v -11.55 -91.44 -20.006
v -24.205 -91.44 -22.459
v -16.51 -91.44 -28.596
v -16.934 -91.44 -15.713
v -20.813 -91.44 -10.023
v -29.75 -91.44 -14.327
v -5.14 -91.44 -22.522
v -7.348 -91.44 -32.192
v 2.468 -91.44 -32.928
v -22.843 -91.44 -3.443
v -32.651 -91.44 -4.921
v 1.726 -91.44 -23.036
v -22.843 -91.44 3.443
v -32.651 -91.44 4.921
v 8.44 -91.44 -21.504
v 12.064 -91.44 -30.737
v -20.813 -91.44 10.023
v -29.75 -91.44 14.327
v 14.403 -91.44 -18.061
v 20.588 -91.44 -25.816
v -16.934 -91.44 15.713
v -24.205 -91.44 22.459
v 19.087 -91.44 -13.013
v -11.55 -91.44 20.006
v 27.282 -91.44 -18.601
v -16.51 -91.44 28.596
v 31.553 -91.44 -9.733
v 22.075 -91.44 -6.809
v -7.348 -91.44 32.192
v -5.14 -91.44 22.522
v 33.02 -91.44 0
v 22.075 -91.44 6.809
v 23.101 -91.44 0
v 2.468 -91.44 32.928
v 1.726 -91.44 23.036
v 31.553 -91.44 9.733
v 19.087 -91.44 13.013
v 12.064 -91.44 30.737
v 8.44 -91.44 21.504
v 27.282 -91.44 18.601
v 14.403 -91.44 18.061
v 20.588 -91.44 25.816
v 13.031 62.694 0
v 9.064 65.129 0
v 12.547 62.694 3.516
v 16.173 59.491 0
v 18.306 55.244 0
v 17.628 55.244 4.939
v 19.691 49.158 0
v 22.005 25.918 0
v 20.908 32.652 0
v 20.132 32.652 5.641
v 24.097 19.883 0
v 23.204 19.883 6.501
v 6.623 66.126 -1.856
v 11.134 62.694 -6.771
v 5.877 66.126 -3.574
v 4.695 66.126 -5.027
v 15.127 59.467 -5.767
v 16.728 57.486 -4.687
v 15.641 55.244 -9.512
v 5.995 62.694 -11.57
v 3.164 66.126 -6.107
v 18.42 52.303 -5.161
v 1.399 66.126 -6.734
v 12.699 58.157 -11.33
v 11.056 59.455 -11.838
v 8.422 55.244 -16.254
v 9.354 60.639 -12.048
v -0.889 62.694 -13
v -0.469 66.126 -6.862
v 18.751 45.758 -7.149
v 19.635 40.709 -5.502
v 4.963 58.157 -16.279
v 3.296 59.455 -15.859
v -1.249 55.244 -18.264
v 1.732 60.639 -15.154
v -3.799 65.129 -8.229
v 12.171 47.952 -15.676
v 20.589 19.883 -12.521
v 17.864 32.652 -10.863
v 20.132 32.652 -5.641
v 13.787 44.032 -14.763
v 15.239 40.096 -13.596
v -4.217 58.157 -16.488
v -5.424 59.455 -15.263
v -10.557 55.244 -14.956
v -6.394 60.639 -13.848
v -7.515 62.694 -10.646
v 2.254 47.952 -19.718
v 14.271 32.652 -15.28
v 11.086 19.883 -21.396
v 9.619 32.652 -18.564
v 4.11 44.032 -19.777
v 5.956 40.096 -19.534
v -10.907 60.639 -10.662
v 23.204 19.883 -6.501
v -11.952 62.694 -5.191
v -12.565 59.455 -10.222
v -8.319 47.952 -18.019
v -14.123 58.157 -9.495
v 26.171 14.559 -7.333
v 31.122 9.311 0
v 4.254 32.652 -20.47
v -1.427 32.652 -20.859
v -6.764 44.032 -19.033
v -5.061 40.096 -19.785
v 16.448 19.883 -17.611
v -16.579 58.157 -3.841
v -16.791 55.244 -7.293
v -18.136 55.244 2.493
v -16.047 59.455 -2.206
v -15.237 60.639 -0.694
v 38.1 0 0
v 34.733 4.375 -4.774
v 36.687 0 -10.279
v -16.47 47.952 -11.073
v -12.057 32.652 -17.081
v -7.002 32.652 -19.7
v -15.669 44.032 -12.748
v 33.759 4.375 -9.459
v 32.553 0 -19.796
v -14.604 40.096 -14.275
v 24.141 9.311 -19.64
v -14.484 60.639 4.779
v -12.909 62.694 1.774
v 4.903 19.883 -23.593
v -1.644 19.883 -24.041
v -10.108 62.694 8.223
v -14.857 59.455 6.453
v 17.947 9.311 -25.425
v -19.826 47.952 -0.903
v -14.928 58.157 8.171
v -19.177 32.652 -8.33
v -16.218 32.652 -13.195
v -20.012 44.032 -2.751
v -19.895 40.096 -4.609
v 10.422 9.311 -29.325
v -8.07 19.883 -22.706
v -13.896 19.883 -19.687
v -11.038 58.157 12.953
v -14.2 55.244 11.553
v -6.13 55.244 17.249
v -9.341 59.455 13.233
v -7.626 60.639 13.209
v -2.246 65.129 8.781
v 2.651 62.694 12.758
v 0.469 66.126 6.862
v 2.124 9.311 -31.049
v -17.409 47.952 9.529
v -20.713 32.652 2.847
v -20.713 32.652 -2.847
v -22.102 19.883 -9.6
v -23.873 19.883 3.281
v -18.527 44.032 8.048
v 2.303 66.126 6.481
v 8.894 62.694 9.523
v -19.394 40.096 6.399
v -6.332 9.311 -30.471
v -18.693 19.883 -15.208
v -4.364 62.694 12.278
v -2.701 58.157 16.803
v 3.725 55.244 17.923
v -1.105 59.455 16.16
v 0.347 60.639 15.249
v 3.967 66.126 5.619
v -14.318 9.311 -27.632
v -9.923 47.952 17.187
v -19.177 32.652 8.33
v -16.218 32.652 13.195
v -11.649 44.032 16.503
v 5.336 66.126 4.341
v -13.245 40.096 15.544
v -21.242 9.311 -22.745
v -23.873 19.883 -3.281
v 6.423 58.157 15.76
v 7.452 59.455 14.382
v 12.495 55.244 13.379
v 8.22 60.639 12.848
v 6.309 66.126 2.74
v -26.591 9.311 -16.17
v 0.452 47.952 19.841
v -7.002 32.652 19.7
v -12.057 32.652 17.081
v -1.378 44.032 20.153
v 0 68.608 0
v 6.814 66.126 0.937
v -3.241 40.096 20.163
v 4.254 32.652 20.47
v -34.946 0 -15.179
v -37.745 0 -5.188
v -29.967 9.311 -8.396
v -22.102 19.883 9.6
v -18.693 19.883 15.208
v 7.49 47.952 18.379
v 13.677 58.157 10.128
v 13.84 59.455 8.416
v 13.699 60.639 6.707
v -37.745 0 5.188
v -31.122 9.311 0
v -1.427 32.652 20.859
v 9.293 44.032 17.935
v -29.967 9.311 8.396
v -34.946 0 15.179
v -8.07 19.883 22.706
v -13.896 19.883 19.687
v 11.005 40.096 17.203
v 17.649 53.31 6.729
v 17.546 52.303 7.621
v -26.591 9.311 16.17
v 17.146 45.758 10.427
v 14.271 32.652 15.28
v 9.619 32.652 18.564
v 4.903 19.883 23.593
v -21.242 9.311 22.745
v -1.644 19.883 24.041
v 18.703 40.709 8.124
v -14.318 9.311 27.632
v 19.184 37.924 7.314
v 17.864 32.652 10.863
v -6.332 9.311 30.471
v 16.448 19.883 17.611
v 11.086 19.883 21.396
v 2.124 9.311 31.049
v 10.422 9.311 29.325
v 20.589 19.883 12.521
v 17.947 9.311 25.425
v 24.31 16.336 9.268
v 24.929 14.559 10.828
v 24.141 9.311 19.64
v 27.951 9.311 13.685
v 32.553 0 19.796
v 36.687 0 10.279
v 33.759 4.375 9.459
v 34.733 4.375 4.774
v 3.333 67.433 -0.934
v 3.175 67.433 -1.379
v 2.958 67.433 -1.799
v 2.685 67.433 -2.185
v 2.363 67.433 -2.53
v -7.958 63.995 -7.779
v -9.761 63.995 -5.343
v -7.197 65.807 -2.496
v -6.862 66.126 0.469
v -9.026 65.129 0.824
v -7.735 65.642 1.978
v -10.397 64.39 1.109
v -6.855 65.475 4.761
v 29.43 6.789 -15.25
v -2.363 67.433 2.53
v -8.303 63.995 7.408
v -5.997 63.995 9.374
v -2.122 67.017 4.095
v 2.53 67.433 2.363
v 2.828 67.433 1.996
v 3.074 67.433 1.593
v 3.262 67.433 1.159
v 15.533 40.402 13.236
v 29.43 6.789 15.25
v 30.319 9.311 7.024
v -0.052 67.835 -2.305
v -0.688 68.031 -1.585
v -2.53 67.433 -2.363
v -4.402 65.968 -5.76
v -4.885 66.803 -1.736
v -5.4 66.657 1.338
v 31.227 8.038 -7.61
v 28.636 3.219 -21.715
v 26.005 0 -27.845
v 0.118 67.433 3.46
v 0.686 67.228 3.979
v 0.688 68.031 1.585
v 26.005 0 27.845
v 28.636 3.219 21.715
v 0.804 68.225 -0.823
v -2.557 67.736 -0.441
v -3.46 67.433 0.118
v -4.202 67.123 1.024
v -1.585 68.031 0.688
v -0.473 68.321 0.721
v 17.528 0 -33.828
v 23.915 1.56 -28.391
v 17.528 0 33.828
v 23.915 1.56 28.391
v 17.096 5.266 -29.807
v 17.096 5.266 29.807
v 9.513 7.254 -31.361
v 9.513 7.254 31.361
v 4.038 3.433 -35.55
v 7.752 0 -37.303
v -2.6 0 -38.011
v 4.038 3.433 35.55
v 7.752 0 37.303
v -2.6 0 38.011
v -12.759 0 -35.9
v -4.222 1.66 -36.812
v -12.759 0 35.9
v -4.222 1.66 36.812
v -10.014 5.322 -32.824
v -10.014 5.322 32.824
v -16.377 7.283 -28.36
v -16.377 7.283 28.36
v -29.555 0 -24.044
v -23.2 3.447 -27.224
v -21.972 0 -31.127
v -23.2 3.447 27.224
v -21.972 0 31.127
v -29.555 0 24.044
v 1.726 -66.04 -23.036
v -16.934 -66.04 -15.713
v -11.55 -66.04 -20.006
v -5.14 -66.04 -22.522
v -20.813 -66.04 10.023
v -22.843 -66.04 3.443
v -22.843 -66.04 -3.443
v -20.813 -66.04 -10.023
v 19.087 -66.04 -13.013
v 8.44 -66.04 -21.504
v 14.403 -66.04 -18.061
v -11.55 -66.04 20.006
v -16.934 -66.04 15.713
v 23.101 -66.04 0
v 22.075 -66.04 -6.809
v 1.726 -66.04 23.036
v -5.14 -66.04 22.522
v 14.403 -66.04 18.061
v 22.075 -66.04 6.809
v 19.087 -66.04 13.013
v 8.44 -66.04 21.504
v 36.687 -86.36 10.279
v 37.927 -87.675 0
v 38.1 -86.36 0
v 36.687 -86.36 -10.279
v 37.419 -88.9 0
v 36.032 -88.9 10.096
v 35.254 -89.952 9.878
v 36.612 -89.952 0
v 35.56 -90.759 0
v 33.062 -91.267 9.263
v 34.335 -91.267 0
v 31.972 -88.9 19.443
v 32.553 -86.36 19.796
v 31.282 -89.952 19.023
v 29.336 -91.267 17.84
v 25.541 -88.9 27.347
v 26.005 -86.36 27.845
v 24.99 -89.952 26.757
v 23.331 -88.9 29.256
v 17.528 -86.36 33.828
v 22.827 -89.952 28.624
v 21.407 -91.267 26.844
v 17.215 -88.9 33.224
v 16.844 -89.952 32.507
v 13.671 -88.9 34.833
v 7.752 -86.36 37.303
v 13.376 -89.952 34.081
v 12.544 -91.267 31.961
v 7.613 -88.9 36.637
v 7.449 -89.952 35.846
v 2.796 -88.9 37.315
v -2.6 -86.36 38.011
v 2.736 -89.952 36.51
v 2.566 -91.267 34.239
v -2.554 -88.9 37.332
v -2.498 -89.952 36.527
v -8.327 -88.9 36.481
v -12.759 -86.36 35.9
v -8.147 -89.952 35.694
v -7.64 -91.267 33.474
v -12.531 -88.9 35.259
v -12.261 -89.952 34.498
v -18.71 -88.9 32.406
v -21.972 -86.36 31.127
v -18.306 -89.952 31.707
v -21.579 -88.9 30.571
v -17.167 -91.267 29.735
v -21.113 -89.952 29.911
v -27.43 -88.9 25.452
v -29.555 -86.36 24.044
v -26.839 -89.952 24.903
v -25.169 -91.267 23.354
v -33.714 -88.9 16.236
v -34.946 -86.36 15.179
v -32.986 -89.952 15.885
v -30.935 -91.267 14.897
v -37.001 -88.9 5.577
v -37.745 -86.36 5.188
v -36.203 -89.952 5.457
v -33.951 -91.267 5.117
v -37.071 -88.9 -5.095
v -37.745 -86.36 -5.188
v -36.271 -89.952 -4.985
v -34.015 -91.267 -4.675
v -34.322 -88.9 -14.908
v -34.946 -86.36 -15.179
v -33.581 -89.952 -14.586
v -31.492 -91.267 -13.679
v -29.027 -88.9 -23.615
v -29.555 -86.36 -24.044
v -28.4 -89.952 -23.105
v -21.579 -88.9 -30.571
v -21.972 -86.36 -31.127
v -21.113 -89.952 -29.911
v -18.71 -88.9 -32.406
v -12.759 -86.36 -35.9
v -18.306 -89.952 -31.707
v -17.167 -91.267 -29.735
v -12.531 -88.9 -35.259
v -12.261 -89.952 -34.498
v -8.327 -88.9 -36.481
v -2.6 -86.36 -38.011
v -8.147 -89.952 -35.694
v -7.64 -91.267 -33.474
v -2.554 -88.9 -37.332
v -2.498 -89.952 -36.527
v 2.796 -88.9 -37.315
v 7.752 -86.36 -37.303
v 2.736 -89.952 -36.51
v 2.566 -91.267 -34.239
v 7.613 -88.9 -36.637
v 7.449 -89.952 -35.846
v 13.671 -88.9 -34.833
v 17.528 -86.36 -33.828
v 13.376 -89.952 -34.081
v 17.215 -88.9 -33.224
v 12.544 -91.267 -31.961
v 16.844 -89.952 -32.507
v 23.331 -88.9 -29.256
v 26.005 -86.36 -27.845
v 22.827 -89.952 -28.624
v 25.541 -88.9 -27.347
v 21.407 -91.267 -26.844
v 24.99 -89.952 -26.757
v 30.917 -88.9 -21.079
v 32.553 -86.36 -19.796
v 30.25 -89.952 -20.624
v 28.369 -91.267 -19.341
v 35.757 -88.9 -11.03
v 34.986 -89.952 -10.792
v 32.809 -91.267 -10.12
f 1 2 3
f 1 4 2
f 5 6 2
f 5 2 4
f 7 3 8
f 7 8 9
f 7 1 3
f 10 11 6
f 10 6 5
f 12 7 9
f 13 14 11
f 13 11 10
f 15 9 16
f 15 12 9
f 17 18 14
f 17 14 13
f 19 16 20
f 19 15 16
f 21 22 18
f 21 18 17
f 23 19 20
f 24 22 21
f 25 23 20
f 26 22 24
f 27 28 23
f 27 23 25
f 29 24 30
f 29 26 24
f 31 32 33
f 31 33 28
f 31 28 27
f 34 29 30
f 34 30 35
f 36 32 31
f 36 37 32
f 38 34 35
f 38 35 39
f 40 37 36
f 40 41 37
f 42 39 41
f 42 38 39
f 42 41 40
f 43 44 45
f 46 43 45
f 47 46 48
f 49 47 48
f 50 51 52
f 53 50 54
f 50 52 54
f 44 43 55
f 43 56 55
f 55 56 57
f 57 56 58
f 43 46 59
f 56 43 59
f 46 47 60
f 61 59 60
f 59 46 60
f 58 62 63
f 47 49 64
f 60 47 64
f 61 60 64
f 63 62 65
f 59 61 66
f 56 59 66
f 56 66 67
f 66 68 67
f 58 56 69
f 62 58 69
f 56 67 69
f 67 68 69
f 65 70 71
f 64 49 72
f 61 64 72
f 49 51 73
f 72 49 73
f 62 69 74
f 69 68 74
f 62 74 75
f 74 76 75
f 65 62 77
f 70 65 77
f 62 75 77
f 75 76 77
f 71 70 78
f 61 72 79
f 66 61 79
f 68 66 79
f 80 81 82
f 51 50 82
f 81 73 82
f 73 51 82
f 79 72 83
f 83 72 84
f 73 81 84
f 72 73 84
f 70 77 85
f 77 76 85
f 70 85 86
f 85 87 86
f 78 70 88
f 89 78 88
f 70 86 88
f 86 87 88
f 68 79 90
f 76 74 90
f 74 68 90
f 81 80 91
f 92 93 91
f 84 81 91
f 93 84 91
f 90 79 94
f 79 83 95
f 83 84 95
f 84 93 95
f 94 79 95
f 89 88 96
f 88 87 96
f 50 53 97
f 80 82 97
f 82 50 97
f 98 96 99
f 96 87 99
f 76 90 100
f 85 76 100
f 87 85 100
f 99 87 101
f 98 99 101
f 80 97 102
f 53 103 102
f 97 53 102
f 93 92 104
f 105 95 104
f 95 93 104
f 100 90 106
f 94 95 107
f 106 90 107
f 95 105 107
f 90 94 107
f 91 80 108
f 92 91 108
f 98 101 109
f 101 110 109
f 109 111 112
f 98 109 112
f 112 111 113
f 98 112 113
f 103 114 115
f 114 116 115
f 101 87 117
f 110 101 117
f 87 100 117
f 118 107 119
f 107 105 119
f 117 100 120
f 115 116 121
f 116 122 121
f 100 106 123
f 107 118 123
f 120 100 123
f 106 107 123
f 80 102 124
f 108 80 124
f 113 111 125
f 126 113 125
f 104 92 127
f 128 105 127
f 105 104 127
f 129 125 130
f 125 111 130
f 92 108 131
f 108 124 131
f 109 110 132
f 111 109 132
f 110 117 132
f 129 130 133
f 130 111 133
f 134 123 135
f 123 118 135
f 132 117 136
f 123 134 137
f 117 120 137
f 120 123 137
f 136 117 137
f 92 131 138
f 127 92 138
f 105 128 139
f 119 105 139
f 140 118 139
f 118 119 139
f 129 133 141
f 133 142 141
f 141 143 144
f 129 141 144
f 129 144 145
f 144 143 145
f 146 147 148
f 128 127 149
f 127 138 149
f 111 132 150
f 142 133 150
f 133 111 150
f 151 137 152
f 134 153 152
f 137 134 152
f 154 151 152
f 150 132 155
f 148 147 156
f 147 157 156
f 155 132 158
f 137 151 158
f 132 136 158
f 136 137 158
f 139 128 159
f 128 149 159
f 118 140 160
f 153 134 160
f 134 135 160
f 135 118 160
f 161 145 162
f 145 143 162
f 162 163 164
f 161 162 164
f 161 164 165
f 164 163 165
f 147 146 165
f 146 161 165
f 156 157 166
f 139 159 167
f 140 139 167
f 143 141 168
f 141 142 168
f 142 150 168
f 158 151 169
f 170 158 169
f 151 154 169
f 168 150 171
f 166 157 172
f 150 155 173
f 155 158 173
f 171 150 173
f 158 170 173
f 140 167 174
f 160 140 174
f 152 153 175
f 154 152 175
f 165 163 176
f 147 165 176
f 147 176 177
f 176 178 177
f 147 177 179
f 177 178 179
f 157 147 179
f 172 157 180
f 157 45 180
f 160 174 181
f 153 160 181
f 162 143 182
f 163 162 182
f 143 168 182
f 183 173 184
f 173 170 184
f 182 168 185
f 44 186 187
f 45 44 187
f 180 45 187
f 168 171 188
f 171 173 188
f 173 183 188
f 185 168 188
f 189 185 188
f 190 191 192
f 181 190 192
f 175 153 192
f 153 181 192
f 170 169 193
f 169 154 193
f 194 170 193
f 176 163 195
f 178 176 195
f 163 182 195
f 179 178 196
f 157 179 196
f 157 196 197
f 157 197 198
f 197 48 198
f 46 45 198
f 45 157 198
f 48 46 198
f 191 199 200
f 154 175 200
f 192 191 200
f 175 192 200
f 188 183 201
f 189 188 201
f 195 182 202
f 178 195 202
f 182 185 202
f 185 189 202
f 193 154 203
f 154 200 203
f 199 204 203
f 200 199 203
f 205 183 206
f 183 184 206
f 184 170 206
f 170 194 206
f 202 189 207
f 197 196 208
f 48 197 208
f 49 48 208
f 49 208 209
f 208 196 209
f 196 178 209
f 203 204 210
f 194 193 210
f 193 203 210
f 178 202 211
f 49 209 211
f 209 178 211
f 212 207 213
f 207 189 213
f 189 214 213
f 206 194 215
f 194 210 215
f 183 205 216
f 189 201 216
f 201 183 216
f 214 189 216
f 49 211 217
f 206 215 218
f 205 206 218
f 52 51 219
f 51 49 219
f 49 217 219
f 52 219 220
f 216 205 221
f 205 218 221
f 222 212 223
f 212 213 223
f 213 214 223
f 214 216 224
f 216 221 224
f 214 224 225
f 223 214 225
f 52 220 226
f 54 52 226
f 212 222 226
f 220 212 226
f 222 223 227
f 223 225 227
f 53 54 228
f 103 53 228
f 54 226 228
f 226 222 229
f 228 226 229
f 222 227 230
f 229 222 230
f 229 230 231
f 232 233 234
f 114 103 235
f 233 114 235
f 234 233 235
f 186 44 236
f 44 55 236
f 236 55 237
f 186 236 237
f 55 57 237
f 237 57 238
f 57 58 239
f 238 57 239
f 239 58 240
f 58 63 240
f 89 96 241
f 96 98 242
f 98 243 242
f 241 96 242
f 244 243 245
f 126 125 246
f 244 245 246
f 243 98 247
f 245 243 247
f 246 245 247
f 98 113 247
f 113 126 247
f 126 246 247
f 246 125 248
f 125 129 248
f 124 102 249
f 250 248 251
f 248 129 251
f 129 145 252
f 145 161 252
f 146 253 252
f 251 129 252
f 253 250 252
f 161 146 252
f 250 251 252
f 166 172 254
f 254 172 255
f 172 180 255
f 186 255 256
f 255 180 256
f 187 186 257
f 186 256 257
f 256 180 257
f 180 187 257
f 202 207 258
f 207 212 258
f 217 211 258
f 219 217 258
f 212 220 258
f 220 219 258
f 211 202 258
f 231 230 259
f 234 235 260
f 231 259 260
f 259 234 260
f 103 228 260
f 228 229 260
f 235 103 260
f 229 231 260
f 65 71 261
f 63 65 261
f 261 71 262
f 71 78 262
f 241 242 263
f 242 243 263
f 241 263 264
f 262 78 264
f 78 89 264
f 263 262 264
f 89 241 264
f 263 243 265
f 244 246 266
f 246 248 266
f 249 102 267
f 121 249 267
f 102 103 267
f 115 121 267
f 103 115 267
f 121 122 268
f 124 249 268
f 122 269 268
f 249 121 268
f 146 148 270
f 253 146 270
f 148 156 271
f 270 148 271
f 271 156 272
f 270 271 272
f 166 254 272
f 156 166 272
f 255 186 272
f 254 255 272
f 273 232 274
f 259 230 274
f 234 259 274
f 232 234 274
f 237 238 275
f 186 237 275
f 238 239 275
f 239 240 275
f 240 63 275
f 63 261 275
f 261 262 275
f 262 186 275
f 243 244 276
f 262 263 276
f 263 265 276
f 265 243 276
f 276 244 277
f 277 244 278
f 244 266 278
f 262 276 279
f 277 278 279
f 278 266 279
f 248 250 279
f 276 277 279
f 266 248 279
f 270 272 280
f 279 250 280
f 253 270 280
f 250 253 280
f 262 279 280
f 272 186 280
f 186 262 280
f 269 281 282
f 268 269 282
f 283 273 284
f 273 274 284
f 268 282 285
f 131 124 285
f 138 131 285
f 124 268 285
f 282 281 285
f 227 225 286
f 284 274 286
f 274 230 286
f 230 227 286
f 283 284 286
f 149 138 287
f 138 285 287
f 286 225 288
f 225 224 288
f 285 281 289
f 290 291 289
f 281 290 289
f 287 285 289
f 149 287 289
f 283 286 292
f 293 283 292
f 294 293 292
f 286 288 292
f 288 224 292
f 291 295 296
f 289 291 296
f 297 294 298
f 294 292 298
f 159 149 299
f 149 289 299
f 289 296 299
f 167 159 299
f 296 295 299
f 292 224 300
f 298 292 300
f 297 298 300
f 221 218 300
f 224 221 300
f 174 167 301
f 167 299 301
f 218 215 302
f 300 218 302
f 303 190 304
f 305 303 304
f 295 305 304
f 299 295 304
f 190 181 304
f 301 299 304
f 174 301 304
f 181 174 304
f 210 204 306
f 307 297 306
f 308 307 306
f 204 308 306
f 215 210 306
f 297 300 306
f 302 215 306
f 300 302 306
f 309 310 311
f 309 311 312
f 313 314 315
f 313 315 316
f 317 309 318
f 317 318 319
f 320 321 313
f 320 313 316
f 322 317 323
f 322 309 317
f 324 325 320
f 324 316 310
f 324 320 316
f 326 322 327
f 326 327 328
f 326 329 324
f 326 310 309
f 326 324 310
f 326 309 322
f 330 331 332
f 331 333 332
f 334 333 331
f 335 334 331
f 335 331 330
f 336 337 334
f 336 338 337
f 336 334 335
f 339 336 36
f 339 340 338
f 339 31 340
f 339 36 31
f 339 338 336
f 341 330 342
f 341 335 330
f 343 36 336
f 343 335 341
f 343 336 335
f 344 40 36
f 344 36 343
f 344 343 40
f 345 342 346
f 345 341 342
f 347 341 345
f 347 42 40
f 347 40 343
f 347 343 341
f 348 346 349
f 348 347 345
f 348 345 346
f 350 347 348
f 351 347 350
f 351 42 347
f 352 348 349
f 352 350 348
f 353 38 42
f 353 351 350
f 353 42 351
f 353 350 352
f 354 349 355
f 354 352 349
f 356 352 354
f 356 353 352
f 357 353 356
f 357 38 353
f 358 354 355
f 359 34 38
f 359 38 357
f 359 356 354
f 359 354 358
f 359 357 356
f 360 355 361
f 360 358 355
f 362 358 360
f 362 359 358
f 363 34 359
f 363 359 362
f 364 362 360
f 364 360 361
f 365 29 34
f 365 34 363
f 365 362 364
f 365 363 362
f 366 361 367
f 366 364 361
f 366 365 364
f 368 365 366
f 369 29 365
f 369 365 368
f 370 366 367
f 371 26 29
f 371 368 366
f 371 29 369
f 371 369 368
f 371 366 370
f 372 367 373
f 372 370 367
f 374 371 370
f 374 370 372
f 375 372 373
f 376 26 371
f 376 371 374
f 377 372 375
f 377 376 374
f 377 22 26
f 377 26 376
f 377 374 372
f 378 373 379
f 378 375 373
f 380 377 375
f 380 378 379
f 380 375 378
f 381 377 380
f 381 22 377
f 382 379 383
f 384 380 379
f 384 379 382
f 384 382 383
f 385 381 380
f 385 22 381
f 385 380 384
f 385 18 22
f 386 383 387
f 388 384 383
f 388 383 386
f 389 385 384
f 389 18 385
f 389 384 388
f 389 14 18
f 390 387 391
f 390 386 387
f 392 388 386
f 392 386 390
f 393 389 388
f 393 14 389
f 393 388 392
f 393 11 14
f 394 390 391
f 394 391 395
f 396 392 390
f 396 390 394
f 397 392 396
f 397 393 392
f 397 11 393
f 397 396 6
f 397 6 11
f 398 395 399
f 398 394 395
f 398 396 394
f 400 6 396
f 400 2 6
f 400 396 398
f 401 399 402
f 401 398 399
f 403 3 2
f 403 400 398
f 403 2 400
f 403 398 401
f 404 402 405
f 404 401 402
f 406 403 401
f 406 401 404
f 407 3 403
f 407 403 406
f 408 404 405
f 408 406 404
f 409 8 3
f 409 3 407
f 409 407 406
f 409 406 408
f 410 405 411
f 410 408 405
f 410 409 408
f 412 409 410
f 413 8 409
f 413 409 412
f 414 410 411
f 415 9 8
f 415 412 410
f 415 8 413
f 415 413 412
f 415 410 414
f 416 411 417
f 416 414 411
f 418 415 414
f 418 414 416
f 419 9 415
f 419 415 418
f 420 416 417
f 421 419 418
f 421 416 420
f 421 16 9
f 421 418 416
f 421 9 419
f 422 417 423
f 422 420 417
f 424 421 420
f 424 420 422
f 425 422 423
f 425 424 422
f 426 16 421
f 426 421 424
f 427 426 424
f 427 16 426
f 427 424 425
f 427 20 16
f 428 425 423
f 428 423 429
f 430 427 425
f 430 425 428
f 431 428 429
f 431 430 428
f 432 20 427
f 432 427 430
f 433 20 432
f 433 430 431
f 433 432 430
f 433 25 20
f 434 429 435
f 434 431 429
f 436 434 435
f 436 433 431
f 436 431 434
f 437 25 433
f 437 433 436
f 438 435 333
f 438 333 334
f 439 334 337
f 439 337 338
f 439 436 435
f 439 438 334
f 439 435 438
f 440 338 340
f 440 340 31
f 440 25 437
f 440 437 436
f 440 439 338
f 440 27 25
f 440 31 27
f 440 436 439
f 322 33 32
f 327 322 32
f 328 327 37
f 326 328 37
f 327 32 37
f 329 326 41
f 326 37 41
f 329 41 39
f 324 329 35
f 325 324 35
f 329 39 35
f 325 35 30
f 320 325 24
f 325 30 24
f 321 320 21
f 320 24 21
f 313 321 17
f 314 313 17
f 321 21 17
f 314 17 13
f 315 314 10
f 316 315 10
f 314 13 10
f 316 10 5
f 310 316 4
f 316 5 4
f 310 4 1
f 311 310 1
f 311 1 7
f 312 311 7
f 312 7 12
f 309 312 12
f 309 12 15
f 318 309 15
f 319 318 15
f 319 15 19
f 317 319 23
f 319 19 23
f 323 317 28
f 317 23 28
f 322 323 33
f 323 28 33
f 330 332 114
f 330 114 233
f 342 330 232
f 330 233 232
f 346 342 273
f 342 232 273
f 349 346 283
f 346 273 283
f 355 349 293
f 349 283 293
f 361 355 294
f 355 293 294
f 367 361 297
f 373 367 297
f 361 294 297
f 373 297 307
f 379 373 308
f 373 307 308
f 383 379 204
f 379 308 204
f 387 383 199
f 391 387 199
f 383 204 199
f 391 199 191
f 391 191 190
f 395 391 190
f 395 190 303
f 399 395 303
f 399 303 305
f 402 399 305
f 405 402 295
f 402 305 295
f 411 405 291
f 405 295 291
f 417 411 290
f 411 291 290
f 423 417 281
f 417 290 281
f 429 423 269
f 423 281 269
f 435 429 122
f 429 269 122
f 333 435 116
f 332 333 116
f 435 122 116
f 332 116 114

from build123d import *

# Parameters (mm, degrees)
F0_R     = 38.1
F1_DEPTH = 91.44
F2_R     = 23.1008347908
F3_DEPTH = 25.4
F4_R     = 5.08


with BuildPart() as f1:
    # F0 (on Front) → F1 (new body)
    with BuildSketch(Plane.XZ):
        Circle(F0_R)
    extrude(amount=F1_DEPTH)

    # F2 (on face) → F3 (cut)
    with BuildSketch(Plane.XZ.offset(91.44)):
        Circle(F2_R)
    extrude(amount=-F3_DEPTH, mode=Mode.SUBTRACT)

    # F4
    f4_edges = [f1.edges().sort_by_distance(p)[0] for p in [
        (-38.1, -91.44, 0),
    ]]
    fillet(f4_edges, radius=F4_R)

    # F5 (on Top) → F6 (revolve)
    with BuildSketch(Plane.XY):
        with BuildLine():
            Line((0, 68.6084377315), (0, 0))
            Line((0, 0), (38.1, 0))
            add(Edge.make_bspline(
                [(0, 68.6084377315), (6.2479440962, 66.531043979), (20.3802893777, 61.8529112655), (20.0334067384, 35.4150108531), (23.0129778355, 17.0896280583), (35.4184549534, 4.6880386636), (38.1, 0)],
                knots=[0, 0, 0, 0, 0.238836495, 0.5037885419, 0.7463651992, 1, 1, 1, 1], degree=3))
        make_face()
    revolve(axis=Axis((0, 34.3042188658, 0), (0, 1, 0)))


solid = f1.part
